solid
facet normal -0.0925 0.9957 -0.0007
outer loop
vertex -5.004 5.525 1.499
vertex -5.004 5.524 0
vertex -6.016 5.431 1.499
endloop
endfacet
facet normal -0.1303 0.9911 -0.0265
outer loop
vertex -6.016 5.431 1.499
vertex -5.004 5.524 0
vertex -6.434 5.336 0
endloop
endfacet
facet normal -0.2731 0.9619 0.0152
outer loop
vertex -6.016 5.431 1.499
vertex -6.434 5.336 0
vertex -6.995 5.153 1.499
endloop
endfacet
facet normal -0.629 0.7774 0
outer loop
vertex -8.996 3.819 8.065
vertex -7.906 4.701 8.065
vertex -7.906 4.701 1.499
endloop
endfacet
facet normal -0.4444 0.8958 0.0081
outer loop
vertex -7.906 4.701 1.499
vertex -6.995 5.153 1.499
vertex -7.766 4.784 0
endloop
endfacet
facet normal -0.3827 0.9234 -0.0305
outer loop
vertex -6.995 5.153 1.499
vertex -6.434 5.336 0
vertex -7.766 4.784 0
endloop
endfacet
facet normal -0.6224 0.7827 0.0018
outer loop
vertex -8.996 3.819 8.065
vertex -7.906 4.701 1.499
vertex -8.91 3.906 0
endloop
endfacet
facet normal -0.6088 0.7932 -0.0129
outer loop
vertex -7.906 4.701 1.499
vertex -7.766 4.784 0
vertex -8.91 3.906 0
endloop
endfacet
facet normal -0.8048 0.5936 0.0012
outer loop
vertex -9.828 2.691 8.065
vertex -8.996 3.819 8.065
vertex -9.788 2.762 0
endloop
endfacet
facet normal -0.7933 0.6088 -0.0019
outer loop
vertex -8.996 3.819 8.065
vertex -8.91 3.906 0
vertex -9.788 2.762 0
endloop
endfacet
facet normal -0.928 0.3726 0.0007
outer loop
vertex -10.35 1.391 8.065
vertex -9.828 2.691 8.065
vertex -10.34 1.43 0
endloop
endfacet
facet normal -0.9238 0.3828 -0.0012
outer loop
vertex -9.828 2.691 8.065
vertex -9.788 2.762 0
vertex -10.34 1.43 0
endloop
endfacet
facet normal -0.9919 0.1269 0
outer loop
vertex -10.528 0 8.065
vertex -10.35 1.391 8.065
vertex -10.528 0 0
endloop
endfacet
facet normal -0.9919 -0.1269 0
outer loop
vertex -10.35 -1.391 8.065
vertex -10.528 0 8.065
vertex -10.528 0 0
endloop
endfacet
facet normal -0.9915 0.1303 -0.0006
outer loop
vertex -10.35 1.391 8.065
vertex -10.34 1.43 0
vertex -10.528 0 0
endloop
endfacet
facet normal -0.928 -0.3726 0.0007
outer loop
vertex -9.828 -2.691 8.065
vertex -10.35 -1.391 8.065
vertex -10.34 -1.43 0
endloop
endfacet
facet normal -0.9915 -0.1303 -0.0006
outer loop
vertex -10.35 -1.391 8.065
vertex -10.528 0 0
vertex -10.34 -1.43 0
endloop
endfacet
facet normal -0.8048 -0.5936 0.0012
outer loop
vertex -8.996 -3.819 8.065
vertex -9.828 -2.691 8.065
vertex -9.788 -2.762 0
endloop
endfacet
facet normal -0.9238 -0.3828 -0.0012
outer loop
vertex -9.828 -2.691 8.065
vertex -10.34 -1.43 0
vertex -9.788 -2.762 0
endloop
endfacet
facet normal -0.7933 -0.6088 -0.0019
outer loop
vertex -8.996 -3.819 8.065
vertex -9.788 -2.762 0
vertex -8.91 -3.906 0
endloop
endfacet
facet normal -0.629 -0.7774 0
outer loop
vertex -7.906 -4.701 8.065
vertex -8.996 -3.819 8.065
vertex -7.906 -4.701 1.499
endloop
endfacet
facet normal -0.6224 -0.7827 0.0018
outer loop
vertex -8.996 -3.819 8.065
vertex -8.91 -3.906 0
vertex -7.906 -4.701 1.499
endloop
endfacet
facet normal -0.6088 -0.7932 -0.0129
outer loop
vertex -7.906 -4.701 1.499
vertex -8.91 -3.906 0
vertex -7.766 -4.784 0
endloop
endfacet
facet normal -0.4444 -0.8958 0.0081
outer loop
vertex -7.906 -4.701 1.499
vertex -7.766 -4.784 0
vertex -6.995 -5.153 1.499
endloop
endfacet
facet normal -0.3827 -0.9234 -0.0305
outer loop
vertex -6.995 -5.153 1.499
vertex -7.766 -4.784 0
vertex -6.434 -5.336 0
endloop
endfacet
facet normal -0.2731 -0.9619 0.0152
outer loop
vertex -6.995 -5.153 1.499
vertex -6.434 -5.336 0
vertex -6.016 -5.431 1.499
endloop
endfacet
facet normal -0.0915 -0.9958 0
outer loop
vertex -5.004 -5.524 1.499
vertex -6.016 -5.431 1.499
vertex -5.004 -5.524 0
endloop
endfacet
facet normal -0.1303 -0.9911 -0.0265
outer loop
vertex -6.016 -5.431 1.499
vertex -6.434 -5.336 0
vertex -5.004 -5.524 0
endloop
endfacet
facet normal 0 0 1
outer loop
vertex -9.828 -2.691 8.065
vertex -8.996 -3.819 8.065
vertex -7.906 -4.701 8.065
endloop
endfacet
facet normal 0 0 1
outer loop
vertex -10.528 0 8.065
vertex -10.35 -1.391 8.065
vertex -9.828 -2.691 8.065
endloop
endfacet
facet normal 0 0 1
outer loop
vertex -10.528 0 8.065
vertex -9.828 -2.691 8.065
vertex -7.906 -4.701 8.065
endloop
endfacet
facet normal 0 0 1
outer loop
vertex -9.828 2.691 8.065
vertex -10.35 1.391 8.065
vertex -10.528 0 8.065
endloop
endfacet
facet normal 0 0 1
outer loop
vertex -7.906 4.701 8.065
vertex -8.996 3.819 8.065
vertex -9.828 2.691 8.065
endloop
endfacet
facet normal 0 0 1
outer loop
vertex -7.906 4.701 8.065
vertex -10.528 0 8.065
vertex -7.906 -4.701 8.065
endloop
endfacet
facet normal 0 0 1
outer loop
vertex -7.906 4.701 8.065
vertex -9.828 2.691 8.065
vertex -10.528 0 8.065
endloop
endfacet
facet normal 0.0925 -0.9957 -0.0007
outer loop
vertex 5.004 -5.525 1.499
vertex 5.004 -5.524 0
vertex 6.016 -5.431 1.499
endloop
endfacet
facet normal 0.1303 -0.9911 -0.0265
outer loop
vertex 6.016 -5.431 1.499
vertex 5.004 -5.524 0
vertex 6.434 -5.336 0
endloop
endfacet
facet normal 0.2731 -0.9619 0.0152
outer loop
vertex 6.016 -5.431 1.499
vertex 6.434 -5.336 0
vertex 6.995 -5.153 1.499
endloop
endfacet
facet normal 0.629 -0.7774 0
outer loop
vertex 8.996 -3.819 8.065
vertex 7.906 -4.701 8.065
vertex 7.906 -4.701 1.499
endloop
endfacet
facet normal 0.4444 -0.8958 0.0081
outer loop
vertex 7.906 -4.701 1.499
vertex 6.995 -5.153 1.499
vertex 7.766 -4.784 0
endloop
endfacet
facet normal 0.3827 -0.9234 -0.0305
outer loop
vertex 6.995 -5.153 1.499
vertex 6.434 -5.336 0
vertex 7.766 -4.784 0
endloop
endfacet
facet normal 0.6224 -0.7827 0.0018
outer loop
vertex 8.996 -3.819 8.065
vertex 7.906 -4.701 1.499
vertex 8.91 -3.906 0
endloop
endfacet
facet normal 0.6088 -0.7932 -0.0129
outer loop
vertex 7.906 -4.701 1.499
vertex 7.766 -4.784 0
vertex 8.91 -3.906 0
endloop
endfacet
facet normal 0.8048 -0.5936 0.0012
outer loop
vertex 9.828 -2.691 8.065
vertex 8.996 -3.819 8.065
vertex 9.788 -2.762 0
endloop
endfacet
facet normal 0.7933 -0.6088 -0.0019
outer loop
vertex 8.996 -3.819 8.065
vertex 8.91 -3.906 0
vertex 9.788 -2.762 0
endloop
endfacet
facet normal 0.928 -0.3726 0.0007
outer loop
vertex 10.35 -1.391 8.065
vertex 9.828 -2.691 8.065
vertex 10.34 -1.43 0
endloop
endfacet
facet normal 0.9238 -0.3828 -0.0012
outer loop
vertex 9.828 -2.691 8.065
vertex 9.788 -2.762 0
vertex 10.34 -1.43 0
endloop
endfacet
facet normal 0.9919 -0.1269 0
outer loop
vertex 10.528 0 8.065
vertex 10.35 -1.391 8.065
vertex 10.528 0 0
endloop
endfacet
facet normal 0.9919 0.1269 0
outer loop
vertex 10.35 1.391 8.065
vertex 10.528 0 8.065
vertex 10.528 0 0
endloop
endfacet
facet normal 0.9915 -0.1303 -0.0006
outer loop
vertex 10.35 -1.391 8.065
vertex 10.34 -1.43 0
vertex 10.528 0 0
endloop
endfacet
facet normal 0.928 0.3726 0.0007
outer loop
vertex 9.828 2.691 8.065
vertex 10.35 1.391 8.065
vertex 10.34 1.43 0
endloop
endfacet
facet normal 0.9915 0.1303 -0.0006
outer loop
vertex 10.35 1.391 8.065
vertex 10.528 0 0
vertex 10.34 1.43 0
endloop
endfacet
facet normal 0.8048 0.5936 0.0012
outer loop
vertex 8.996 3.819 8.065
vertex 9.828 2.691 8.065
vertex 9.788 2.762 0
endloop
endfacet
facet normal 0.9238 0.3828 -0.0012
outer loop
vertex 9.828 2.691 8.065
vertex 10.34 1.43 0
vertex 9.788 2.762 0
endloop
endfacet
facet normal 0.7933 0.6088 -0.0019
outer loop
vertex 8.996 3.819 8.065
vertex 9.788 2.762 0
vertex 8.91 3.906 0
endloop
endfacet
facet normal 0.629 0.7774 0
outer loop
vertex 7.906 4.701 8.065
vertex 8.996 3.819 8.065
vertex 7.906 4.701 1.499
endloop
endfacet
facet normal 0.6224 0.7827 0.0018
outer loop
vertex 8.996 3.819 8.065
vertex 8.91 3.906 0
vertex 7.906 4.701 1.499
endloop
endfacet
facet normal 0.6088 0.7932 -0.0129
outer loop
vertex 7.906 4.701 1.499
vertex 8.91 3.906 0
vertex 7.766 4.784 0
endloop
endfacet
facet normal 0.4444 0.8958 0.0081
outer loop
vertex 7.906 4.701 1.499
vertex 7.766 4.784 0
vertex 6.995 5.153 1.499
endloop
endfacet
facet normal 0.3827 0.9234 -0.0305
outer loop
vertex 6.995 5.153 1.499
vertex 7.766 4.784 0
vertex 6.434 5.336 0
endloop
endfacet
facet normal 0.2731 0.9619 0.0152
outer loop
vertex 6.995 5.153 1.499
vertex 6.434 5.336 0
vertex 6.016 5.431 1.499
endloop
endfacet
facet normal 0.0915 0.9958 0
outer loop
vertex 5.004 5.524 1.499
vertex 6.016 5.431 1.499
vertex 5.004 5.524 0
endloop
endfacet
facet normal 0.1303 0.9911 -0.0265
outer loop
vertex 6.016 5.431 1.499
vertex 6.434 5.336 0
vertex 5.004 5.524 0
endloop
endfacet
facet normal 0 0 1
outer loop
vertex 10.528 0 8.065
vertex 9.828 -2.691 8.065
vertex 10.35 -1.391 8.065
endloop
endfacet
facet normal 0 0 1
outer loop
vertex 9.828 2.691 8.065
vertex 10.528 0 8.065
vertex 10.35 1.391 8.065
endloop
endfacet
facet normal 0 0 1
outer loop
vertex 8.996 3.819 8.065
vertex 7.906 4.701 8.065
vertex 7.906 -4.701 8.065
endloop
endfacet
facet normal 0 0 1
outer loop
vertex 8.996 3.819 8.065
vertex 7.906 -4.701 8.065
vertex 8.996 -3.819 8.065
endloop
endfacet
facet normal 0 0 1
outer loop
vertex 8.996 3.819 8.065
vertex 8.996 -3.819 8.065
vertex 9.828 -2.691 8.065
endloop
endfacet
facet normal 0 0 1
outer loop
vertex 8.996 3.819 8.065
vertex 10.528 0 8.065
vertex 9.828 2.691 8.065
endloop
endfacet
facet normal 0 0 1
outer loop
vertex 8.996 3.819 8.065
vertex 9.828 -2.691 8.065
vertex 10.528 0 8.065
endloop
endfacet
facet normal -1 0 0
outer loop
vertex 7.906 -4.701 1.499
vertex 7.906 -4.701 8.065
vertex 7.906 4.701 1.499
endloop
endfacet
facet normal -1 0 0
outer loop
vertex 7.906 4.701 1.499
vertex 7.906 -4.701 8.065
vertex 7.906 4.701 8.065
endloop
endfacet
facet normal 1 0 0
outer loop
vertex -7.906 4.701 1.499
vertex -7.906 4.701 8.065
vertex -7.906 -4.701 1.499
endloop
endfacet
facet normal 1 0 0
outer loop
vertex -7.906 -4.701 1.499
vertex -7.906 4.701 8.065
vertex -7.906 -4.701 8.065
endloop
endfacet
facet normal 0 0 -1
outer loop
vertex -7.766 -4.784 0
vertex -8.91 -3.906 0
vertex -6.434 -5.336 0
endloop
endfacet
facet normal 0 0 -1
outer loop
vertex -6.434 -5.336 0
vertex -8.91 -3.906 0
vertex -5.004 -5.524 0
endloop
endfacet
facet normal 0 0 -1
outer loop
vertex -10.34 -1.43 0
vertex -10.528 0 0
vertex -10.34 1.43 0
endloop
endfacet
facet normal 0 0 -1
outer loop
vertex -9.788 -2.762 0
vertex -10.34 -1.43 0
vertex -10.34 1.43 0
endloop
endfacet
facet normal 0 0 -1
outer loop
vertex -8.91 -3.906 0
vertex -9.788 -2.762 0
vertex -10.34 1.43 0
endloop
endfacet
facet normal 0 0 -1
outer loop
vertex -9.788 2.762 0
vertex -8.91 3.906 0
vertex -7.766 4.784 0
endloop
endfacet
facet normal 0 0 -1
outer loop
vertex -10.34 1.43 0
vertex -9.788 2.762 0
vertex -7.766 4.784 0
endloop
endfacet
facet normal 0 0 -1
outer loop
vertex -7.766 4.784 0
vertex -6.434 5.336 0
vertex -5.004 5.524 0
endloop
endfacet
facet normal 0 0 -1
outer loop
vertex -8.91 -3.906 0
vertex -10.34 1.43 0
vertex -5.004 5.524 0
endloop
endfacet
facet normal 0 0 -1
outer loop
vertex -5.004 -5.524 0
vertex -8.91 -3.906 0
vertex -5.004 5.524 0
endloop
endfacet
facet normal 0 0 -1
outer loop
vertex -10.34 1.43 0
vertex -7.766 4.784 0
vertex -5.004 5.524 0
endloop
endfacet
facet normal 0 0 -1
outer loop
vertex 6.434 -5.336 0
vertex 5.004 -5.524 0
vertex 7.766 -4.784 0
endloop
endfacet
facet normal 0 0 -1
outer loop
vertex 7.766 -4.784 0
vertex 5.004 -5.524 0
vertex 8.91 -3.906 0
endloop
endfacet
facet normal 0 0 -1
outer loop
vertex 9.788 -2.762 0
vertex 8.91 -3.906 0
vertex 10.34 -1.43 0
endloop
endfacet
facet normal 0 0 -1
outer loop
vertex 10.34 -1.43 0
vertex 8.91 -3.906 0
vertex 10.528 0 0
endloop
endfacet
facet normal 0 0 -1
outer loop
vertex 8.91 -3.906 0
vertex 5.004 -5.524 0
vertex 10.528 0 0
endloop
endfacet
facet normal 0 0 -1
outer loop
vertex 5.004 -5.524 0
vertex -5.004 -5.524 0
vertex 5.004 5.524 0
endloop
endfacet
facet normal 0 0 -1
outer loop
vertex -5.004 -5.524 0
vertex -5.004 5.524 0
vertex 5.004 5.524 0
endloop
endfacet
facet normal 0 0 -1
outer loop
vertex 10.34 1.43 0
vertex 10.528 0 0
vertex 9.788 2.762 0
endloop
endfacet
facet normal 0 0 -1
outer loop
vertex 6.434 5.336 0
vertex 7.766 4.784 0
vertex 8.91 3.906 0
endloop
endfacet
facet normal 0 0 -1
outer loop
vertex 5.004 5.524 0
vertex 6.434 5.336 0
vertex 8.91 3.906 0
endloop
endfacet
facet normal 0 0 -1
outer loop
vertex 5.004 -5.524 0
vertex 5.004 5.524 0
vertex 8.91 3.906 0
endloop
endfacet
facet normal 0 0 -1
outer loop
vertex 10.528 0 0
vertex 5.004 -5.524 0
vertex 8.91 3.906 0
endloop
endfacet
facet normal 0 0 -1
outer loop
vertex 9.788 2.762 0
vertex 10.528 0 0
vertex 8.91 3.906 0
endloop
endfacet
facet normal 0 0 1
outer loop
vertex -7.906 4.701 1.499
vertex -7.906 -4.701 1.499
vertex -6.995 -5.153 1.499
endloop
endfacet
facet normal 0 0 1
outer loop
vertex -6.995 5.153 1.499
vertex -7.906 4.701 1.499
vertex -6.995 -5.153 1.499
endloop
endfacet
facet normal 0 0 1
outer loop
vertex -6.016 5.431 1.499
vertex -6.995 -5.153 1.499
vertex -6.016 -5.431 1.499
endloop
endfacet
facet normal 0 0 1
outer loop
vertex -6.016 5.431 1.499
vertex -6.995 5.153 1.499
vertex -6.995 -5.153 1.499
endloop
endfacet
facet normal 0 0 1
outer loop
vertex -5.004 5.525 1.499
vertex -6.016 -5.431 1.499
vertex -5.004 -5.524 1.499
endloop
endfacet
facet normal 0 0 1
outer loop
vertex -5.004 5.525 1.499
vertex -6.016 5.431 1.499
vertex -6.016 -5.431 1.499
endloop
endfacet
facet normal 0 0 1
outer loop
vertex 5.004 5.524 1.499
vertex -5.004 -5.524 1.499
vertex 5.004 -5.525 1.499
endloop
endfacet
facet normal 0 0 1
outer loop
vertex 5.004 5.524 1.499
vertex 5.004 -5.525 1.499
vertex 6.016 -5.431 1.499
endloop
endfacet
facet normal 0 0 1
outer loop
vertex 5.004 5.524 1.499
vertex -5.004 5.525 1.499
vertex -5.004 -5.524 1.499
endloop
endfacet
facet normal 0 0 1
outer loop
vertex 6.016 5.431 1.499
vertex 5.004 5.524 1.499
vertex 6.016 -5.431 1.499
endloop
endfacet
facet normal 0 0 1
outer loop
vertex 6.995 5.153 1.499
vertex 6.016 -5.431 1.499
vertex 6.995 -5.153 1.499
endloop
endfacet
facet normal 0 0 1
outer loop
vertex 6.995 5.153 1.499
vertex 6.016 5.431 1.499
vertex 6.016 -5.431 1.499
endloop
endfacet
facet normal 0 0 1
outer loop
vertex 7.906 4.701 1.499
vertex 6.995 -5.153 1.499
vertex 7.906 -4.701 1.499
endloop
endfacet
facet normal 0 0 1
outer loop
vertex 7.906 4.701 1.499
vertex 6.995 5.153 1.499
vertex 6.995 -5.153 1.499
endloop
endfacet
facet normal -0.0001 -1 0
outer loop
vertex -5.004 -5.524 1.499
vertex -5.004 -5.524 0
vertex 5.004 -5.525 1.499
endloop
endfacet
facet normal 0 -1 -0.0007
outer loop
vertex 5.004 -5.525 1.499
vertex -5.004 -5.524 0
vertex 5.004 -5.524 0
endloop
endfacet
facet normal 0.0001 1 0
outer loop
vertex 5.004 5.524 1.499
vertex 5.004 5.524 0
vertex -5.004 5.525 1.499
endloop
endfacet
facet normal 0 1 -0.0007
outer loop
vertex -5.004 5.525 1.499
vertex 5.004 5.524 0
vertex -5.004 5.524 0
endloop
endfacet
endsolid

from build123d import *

# Parameters (mm, degrees)
F1_DEPTH = 8.0645
F3_DEPTH = 6.5659


with BuildPart() as f1:
    # F0 (on Top) → F1 (new body)
    with BuildSketch(Plane.XY):
        with BuildLine():
            ThreePointArc((5.0038, -5.5245), (10.5283, 0), (5.0038, 5.5245))
            Line((5.0038, 5.5245), (-5.0038, 5.5245))
            ThreePointArc((-5.0038, 5.5245), (-10.5283, 0), (-5.0038, -5.5245))
            Line((-5.0038, -5.5245), (5.0038, -5.5245))
        make_face()
    extrude(amount=F1_DEPTH)

    # F2 (on face) → F3 (cut)
    with BuildSketch(Plane.XY.offset(8.0645)):
        with BuildLine():
            Line((7.90575, -4.700935), (7.90575, 4.700935))
            ThreePointArc((7.90575, 4.700935), (6.512075, 5.314622), (5.0038, 5.5245))
            Line((5.0038, 5.5245), (-5.0038, 5.5245))
            ThreePointArc((-5.0038, 5.5245), (-6.512075, 5.314622), (-7.90575, 4.700935))
            Line((-7.90575, 4.700935), (-7.90575, -4.700935))
            ThreePointArc((-7.90575, -4.700935), (-6.512075, -5.314622), (-5.0038, -5.5245))
            Line((-5.0038, -5.5245), (5.0038, -5.5245))
            ThreePointArc((5.0038, -5.5245), (6.512075, -5.314622), (7.90575, -4.700935))
        make_face()
    extrude(amount=-F3_DEPTH, mode=Mode.SUBTRACT)


solid = f1.part
